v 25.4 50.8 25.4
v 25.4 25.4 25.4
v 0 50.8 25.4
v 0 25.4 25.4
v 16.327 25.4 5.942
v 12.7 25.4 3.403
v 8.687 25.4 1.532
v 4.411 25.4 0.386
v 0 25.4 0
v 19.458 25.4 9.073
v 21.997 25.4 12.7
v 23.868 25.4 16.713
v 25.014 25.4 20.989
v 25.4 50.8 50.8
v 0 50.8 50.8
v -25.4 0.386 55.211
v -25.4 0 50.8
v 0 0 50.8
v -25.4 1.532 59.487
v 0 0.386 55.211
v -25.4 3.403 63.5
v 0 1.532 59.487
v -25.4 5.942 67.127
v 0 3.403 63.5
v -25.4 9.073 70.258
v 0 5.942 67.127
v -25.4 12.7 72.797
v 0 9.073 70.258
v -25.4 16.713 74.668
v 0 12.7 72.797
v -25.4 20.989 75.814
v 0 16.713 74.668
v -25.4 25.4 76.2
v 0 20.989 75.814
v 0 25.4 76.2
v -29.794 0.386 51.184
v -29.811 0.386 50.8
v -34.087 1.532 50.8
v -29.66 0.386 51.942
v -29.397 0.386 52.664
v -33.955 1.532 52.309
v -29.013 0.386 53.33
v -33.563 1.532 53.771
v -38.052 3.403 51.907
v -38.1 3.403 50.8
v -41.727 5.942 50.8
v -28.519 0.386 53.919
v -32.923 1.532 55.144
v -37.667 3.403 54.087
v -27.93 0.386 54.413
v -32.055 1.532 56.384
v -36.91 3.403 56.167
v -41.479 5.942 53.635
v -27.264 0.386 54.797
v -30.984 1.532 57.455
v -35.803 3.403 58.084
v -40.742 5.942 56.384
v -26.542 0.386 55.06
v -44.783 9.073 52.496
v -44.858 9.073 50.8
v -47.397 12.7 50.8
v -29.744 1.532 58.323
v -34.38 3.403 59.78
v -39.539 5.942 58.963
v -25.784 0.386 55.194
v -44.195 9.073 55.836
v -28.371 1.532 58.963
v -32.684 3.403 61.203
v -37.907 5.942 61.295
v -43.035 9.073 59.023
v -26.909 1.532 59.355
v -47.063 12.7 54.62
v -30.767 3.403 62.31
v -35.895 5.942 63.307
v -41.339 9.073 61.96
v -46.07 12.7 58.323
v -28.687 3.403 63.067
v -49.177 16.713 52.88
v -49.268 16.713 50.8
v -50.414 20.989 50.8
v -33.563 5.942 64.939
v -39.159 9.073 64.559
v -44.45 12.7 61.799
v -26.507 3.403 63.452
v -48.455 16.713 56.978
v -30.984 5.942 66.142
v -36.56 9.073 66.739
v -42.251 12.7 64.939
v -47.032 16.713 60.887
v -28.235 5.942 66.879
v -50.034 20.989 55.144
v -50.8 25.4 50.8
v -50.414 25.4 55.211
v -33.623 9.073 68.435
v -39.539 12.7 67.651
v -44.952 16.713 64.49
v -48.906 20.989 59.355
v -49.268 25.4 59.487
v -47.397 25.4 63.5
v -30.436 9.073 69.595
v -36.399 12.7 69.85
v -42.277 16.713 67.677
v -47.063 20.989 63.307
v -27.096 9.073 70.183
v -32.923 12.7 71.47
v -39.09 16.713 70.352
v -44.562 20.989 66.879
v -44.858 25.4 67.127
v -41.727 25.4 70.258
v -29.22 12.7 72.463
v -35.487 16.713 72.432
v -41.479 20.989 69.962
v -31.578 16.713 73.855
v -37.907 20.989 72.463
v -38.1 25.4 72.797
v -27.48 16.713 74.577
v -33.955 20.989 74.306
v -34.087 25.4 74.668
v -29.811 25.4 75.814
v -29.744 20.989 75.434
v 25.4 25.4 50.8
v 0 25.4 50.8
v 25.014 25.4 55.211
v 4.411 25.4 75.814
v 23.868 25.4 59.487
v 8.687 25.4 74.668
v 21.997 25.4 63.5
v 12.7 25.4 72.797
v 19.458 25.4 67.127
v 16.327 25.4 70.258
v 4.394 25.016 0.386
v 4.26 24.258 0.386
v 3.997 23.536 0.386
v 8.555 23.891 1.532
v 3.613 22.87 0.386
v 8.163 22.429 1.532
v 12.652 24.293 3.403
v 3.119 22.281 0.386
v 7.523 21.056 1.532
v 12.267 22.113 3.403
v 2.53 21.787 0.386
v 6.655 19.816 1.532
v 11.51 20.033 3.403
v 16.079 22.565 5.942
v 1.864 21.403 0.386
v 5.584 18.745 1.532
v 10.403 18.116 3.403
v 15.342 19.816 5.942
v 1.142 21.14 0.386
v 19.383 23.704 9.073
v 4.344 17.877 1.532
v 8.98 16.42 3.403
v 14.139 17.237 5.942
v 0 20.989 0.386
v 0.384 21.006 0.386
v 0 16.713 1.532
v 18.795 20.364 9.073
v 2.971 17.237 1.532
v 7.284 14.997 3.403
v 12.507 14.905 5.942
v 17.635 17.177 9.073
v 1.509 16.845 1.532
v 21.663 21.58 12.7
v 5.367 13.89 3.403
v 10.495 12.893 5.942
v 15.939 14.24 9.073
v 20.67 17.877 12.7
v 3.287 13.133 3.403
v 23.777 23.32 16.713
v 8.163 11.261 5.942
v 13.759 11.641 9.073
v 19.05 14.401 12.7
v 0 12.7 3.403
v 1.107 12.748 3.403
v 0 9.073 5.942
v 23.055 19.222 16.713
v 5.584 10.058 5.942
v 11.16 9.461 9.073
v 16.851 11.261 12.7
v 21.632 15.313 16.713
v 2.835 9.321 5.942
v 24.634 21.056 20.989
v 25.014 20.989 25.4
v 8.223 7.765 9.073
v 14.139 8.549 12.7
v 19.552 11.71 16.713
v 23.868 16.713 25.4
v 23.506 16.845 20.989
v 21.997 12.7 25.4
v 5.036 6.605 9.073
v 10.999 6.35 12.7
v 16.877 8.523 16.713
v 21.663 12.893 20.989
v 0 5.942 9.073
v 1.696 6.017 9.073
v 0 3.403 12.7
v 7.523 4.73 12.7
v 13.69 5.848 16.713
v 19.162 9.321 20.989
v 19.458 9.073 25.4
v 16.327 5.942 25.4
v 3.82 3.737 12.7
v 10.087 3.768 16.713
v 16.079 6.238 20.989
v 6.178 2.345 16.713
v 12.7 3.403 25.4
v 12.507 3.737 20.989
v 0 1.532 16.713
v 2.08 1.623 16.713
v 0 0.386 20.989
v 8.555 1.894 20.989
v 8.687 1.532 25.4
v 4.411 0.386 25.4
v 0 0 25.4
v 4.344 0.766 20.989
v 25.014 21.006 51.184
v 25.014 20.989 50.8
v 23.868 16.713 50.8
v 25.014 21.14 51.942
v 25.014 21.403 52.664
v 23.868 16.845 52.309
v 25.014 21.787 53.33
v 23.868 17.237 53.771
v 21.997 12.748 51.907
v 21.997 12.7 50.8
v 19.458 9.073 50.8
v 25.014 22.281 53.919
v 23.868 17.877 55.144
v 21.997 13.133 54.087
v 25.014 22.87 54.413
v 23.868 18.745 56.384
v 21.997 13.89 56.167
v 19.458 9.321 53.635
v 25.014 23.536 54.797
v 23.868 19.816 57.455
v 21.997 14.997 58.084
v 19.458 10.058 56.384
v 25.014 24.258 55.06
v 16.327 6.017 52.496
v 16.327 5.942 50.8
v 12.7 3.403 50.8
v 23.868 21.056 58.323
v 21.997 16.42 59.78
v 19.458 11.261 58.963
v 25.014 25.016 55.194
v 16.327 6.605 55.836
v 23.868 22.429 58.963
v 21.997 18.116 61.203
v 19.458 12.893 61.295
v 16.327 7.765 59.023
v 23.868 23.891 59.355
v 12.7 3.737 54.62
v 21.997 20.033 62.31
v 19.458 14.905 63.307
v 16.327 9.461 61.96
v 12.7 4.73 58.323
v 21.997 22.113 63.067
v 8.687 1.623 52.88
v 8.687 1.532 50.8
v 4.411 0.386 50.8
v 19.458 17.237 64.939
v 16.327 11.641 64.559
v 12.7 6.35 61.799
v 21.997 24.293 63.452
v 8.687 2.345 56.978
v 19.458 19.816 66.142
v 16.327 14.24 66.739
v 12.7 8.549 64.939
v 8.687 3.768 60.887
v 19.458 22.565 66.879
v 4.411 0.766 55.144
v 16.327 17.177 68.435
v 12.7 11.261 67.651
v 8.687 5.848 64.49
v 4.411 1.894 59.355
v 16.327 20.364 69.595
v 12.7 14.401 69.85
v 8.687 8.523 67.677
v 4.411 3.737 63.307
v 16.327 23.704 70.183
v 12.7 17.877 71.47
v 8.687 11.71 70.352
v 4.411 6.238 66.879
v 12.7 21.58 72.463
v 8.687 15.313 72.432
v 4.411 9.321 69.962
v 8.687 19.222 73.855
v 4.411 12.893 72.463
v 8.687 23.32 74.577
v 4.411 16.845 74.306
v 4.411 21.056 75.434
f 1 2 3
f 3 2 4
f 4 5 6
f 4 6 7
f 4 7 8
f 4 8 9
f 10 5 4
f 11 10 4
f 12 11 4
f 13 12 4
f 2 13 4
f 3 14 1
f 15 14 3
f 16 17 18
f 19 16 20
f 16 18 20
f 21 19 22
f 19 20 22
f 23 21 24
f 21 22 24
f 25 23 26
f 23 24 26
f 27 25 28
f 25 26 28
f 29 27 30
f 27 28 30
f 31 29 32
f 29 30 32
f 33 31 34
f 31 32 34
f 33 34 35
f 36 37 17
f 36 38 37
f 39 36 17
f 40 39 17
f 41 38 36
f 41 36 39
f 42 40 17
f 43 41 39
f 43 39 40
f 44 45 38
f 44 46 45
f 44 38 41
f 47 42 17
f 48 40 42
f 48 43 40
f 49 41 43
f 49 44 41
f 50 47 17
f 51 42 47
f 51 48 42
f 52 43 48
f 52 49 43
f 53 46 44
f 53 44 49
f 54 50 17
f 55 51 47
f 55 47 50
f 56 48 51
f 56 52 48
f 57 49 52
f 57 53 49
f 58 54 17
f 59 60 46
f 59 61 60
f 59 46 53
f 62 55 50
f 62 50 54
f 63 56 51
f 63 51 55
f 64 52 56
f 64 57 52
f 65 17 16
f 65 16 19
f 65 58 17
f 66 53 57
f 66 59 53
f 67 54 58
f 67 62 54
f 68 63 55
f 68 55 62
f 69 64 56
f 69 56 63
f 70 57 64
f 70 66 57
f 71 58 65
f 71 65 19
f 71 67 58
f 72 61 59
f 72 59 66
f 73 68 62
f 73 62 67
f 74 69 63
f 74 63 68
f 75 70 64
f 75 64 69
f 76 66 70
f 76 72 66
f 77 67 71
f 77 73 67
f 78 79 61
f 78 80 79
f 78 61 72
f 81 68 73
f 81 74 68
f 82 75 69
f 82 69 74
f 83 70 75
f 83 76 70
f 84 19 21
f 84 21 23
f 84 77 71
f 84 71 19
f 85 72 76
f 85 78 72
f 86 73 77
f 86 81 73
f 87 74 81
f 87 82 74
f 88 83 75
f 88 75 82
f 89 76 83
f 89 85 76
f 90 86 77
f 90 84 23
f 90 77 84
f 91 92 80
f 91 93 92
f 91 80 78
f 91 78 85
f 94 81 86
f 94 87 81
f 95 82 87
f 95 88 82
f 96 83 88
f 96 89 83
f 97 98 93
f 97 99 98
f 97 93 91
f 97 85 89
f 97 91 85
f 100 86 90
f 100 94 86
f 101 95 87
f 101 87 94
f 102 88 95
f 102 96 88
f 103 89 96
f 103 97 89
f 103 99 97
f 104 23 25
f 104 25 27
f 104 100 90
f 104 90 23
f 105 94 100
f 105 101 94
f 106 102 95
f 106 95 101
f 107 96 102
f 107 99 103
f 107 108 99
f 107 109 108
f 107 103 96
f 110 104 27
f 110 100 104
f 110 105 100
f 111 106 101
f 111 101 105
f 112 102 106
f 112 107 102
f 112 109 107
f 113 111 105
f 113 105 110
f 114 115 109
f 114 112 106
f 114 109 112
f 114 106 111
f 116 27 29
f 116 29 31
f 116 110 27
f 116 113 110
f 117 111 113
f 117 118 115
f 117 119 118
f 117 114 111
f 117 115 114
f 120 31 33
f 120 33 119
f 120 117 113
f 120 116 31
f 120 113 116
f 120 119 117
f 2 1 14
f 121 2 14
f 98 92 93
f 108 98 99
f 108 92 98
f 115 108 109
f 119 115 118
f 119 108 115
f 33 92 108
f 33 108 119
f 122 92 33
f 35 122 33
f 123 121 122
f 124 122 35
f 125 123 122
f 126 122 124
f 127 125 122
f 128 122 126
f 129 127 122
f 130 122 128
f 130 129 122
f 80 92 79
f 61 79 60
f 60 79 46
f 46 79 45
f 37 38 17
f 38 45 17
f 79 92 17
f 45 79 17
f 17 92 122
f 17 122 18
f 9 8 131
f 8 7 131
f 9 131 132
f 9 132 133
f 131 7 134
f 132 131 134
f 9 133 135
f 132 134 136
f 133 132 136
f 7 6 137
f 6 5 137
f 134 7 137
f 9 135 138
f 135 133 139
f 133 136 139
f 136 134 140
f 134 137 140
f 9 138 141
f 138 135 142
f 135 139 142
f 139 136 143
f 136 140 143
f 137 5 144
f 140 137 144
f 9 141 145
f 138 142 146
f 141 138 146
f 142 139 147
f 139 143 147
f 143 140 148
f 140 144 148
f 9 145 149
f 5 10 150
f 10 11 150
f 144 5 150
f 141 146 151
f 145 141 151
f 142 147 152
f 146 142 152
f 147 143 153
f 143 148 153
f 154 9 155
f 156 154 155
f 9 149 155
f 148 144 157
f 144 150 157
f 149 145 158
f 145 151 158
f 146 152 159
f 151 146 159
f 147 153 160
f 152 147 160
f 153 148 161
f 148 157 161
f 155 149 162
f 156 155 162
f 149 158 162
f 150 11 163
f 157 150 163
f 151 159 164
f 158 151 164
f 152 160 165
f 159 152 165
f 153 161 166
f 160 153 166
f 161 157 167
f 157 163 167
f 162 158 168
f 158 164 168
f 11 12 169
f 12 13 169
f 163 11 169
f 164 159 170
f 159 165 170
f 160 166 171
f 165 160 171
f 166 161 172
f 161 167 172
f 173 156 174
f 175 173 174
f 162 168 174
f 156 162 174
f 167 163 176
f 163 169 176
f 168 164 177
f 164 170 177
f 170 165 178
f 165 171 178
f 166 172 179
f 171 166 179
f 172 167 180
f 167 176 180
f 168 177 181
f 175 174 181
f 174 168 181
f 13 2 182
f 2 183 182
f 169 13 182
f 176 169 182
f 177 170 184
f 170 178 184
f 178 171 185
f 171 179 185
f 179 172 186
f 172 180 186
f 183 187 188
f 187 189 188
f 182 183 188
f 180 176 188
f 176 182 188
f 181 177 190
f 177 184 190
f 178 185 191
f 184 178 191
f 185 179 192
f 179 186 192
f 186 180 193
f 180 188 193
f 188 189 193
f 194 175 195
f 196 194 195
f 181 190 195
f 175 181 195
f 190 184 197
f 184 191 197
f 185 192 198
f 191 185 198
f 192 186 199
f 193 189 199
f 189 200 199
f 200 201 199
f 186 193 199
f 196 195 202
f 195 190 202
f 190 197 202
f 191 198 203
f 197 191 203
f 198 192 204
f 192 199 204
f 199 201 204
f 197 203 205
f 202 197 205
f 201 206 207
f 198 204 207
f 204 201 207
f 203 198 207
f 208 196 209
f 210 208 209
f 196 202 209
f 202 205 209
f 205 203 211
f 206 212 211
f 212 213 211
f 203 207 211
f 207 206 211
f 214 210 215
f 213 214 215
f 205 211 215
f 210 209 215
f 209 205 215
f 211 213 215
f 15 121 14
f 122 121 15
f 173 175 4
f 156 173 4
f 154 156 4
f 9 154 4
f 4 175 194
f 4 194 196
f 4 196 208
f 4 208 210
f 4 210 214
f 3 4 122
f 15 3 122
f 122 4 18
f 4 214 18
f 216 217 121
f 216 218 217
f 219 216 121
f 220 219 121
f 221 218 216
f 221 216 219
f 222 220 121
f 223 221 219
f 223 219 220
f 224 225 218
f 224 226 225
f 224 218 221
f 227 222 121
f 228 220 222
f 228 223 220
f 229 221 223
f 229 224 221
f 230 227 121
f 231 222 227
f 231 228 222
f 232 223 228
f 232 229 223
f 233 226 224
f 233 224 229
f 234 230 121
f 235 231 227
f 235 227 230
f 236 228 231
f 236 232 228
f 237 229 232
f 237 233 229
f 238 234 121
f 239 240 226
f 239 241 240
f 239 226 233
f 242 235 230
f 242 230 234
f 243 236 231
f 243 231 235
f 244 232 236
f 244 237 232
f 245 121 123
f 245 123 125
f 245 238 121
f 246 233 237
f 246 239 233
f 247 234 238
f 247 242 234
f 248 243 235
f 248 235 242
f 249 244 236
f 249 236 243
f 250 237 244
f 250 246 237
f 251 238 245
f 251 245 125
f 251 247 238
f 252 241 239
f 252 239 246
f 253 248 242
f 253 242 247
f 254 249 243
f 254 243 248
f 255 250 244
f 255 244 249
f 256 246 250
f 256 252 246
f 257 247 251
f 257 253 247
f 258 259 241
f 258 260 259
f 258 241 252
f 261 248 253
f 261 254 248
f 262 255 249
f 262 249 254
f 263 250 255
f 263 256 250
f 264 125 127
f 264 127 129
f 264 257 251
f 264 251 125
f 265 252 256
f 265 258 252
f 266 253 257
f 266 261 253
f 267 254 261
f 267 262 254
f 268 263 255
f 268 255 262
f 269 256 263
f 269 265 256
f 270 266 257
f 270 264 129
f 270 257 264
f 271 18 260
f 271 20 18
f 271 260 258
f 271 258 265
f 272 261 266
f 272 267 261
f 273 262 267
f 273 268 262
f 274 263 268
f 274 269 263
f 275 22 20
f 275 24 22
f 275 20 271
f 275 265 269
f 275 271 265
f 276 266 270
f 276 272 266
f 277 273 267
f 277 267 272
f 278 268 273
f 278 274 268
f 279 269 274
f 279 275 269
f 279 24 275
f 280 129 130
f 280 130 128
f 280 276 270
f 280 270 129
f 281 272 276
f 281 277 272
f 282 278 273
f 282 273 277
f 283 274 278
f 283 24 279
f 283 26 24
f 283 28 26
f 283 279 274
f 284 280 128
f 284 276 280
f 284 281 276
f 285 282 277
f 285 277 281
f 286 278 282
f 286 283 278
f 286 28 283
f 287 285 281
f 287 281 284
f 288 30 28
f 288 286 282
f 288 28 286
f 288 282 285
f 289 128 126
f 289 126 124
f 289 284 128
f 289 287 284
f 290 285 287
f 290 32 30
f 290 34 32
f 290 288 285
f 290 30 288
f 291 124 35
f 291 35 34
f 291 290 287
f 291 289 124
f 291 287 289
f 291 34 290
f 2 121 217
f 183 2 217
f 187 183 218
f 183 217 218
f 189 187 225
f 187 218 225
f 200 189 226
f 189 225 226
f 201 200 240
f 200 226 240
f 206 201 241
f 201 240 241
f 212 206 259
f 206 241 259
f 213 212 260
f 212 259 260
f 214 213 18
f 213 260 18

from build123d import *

# Parameters (mm, degrees)
F0_W     = 25.4
F0_H     = 25.4
F1_DEPTH = 76.2
F2_W     = 25.4
F2_H     = 25.4
F3_DEPTH = 50.8
F4_W     = 25.4
F4_H     = 25.4
F5_DEPTH = 25.4
F6_R     = 25.39999


# Not quite as in the source:
# - a fillet or chamfer is up to 0.001 mm smaller than in the source, because OpenCascade refuses the exact size


with BuildPart() as f1:
    # F0 (on Top) → F1 (new body)
    with BuildSketch(Plane.XY):
        with Locations((12.7, 12.7)):
            Rectangle(F0_W, F0_H)
    extrude(amount=F1_DEPTH)

    # F2 (on face) → F3 (join)
    with BuildSketch(Plane(origin=(0, 0, 0), x_dir=(0, -1, 0), z_dir=(-1, 0, 0))):
        with Locations((-12.7, 63.5)):
            Rectangle(F2_W, F2_H)
    extrude(amount=F3_DEPTH)

    # F4 (on face) → F5 (join)
    with BuildSketch(Plane(origin=(0, 25.4, 0), x_dir=(-1, 0, 0), z_dir=(0, 1, 0))):
        with Locations((-12.7, 38.1)):
            Rectangle(F4_W, F4_H)
    extrude(amount=F5_DEPTH)

    # F6 (radius 25.4 in the source; OpenCascade refuses exactly that, so slightly less here)
    f6_edges = [f1.edges().sort_by_distance(p)[0] for p in [
        (-50.8, 12.7, 76.2),
        (-50.8, 0, 63.5),
        (-12.7, 0, 76.2),
        (25.4, 0, 38.1),
        (25.4, 12.7, 0),
        (12.7, 0, 0),
        (25.4, 12.7, 76.2),
    ]]
    fillet(f6_edges, radius=F6_R)


solid = f1.part
